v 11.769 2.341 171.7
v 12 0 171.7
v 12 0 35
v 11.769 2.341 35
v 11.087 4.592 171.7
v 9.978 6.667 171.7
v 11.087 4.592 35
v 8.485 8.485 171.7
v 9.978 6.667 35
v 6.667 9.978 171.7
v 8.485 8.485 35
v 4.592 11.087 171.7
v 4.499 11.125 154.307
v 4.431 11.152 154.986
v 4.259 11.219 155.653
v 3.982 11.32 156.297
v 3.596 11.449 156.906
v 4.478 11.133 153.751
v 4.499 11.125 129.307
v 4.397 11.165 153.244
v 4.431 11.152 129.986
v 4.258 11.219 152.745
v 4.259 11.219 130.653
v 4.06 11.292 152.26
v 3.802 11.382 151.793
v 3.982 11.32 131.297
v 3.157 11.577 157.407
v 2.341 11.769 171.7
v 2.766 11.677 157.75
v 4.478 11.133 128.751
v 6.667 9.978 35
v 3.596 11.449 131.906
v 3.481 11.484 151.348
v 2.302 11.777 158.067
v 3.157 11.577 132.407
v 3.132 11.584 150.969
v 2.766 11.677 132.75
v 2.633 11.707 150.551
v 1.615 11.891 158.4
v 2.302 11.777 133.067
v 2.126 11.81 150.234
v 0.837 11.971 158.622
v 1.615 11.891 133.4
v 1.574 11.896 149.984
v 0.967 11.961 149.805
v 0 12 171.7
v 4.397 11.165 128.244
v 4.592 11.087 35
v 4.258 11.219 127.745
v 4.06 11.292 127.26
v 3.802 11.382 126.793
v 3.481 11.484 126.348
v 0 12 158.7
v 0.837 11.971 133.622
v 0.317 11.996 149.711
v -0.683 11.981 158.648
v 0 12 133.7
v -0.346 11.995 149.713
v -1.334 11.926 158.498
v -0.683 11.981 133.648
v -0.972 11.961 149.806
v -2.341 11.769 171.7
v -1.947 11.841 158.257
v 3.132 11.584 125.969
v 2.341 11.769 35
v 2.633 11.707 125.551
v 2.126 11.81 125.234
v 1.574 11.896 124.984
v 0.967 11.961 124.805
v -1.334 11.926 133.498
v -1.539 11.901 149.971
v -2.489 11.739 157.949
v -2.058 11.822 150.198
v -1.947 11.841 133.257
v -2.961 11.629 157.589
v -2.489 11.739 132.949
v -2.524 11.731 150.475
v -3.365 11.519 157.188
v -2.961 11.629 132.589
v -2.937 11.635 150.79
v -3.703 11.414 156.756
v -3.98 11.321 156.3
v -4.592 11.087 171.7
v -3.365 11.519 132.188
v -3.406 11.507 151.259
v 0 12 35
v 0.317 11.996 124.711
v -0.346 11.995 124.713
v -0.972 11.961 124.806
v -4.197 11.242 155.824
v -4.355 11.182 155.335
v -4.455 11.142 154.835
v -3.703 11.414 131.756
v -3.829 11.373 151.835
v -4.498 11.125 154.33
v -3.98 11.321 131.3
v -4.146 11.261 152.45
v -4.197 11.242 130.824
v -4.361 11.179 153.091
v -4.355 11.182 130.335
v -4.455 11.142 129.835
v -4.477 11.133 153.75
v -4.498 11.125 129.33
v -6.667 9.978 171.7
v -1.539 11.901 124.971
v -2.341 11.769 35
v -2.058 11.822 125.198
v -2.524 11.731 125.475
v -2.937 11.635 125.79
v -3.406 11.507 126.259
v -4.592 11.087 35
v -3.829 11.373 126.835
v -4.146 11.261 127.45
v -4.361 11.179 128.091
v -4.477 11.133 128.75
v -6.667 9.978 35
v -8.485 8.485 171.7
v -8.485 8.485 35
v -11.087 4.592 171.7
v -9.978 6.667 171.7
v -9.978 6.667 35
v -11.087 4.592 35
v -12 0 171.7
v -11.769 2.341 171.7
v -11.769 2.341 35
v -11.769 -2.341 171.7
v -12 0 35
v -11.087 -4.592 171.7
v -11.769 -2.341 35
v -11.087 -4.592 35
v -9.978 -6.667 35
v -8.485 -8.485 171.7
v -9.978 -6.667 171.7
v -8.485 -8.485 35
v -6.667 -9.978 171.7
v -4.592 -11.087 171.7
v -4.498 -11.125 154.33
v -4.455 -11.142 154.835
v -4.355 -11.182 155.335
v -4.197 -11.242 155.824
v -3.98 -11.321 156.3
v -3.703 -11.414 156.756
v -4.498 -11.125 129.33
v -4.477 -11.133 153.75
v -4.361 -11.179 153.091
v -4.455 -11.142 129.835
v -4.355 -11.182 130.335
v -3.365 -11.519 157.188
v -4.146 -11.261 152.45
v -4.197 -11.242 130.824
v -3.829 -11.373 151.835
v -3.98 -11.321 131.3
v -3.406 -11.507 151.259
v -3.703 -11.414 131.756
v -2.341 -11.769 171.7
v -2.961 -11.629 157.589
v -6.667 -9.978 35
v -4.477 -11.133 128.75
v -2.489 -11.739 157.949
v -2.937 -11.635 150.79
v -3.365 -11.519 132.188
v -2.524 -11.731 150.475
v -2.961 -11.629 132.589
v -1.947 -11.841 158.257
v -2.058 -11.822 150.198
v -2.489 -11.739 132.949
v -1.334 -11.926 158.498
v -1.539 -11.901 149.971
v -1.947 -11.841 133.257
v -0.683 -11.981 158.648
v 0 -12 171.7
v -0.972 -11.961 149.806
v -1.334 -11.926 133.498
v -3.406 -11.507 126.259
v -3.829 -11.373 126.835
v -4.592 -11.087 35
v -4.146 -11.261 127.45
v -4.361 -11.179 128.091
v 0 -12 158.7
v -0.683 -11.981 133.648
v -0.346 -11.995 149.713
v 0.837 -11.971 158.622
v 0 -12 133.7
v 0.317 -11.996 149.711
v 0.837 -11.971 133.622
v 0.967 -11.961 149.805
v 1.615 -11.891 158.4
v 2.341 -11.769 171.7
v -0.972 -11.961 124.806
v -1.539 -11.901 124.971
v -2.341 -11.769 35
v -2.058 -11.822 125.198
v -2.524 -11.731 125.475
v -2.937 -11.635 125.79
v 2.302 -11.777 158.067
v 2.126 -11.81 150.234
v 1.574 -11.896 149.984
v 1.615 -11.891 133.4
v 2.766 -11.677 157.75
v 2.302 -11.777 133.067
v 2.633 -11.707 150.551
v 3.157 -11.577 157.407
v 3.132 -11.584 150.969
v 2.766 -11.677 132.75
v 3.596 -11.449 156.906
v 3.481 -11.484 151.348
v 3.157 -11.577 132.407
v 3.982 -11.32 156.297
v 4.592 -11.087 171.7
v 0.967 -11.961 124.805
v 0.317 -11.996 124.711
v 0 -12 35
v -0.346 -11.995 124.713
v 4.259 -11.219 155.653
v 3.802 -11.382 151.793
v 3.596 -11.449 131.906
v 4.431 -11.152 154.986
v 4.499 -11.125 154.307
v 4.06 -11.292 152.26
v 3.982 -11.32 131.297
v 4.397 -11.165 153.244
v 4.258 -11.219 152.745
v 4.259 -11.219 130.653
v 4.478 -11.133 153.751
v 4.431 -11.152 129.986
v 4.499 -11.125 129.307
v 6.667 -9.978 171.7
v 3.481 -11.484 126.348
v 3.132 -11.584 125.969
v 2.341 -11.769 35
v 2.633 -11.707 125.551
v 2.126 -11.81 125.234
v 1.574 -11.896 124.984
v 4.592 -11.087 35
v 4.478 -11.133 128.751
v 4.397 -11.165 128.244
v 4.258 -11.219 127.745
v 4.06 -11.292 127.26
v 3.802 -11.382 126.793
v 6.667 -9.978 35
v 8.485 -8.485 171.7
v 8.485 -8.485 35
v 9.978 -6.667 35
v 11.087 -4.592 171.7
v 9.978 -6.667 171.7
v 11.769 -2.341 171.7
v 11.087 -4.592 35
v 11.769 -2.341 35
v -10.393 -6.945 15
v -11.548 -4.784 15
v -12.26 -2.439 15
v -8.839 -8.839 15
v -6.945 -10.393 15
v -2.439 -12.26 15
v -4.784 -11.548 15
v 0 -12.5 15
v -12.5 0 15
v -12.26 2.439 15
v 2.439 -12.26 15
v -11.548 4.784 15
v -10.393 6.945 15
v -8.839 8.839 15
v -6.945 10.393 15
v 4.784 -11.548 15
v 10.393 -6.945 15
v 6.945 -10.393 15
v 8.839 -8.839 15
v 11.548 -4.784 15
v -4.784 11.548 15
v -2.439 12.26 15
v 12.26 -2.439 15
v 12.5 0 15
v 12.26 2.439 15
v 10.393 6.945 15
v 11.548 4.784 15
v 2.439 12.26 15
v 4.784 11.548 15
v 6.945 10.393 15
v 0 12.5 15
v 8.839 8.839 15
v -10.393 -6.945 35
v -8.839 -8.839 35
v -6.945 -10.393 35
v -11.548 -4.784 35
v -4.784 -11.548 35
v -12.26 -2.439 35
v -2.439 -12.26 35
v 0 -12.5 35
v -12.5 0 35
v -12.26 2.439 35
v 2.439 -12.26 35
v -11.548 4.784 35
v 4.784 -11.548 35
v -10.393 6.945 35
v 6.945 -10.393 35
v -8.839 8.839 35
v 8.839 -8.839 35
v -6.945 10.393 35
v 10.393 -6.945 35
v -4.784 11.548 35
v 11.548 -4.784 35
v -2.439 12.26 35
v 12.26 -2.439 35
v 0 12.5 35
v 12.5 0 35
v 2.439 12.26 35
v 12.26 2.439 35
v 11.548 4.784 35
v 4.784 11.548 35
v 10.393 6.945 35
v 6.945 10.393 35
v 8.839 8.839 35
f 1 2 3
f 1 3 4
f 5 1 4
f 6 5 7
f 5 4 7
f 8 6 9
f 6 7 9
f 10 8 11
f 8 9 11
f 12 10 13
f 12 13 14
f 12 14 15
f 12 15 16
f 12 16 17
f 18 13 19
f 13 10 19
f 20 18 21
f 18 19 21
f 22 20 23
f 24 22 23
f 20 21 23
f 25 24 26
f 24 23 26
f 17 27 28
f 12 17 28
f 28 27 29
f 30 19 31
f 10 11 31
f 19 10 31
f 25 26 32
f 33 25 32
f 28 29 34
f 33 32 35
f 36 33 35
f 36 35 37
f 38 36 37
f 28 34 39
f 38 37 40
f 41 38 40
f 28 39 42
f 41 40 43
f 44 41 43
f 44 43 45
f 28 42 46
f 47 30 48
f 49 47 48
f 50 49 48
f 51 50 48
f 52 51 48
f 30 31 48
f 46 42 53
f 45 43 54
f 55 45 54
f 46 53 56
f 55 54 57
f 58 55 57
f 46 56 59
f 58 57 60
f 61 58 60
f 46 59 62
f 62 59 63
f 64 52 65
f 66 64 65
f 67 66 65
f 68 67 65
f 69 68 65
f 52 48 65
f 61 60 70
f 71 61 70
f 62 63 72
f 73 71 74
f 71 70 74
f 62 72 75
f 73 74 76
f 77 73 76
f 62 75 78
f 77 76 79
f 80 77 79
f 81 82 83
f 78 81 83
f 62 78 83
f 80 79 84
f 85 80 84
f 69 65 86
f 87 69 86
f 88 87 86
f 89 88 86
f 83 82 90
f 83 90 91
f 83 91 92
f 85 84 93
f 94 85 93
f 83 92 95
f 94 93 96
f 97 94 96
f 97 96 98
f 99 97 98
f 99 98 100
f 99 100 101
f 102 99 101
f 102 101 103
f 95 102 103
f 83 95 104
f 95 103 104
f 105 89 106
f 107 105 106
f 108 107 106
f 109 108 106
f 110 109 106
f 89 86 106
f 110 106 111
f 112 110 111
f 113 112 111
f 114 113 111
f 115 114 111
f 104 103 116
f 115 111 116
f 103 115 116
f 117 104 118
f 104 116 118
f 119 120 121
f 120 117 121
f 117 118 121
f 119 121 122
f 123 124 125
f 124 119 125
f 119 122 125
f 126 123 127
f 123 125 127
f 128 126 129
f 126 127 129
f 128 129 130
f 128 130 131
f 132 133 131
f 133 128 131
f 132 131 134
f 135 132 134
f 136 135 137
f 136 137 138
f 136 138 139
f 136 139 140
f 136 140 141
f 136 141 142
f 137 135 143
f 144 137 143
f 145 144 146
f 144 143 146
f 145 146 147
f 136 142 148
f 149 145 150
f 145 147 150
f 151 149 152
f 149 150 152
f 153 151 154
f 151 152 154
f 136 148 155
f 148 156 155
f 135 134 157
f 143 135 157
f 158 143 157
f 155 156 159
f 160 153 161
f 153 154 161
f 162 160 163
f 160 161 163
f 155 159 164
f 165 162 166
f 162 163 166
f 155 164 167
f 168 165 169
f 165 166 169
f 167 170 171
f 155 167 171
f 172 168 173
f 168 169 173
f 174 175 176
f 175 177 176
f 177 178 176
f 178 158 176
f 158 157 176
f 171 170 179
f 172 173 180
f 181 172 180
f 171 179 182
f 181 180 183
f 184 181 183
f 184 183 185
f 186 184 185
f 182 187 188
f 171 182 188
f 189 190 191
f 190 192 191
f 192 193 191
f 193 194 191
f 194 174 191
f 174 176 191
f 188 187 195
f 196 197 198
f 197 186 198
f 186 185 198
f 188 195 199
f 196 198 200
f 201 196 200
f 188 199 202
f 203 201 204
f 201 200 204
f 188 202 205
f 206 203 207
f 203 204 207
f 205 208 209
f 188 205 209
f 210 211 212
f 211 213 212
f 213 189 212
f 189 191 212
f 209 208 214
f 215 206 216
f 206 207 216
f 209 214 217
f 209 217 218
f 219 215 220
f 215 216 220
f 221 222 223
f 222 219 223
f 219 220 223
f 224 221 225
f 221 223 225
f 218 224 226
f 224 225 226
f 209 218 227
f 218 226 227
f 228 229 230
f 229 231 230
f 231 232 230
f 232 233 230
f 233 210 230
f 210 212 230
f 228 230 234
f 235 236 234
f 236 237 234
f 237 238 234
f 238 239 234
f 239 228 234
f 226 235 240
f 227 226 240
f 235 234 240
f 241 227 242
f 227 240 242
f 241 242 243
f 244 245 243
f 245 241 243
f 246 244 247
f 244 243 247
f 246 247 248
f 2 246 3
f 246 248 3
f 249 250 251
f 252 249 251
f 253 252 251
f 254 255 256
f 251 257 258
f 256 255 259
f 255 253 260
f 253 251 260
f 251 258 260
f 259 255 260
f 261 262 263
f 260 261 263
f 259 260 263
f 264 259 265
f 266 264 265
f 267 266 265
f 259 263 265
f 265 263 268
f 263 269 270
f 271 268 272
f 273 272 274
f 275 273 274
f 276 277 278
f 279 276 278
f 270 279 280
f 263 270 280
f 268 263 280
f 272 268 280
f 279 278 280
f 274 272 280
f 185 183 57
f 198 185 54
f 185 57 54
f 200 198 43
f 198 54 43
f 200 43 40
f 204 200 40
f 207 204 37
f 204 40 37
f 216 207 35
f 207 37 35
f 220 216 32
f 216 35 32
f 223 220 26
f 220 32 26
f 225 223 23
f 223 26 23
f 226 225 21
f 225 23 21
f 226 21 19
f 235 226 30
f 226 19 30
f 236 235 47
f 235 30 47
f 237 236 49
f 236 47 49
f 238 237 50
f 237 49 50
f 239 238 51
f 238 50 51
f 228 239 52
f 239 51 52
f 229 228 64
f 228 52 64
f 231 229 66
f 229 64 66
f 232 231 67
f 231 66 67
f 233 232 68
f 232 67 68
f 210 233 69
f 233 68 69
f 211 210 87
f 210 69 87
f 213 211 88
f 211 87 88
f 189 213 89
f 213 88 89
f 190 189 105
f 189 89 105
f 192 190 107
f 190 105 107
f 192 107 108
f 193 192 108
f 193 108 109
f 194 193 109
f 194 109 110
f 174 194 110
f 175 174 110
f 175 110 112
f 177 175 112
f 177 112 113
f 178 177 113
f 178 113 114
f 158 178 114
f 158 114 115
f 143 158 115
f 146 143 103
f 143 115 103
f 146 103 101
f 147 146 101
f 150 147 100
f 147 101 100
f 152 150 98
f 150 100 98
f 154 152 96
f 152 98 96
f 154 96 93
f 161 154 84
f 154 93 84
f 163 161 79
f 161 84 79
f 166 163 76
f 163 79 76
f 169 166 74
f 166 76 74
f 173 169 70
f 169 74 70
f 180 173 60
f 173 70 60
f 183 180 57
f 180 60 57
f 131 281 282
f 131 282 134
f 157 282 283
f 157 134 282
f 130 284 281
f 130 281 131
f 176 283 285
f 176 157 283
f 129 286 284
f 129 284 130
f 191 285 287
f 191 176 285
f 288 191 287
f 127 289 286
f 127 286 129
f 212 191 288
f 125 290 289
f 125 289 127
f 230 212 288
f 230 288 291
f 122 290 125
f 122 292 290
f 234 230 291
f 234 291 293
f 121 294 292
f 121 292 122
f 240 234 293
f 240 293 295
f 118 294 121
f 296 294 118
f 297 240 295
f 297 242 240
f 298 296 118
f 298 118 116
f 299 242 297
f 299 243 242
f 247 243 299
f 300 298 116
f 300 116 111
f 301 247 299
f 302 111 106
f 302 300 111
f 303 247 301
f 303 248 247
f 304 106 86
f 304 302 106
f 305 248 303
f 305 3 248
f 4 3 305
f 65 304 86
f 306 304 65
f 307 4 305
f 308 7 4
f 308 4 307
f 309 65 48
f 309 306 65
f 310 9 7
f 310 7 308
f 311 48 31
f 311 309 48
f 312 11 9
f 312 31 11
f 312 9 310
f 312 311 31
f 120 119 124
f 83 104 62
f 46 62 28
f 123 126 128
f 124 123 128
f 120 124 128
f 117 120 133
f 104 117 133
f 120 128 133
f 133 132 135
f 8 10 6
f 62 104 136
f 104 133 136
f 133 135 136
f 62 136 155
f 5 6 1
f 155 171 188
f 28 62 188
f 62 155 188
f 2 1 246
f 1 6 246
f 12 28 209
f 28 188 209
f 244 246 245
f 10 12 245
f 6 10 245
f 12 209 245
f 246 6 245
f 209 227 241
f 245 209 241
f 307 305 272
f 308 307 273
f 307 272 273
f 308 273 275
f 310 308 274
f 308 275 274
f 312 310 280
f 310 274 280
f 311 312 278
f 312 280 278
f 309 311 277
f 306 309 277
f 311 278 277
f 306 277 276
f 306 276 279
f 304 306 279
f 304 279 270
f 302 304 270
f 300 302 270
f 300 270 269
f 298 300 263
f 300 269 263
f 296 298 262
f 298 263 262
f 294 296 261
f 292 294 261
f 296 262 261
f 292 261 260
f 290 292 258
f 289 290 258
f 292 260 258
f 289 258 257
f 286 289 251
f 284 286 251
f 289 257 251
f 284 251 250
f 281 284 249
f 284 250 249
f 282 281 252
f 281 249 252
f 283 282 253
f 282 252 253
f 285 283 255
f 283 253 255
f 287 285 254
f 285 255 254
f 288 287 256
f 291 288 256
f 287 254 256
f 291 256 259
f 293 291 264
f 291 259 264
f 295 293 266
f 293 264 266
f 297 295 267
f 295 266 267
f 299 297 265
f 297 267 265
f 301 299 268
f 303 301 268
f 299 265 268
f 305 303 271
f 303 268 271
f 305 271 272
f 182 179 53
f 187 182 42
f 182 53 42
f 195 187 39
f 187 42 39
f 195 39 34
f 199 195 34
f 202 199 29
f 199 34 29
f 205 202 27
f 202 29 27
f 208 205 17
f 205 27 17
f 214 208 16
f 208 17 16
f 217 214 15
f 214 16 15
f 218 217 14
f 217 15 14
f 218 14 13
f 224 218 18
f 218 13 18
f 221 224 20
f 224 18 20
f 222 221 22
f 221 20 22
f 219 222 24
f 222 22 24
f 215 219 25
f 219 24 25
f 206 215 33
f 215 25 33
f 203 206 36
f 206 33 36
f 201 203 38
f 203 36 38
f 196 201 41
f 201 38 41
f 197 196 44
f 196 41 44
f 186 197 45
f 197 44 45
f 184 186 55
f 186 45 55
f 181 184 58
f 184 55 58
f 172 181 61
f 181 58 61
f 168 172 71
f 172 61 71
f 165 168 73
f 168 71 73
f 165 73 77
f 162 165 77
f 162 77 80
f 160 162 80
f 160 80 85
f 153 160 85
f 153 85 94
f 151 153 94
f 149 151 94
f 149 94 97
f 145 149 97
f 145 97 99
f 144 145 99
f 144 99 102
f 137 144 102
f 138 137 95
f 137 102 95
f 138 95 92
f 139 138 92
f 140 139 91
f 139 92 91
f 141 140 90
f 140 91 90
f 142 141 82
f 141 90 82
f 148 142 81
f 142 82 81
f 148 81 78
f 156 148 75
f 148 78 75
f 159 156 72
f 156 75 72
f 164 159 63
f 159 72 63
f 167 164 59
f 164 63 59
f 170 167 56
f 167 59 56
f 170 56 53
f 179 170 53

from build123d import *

# Parameters (mm, degrees)
SKETCH1_R               = 10
BOSS_EXTRUDE1_DEPTH     = 15
SKETCH2_R               = 12.5
BOSS_EXTRUDE2_DEPTH     = 20
SKETCH3_R               = 12
BOSS_EXTRUDE3_DEPTH     = 139.2
SKETCH4_R               = 4.5
CUT_EXTRUDE1_DEPTH      = 176.094660113
CUT_EXTRUDE2_DEPTH      = 176.094660212
CUT_EXTRUDE2_DEPTH_BACK = 176.094660212
SKETCH5_W               = 50.129657838
SKETCH5_H               = 19.874218845
LPATTERN1_COUNT         = 2
LPATTERN1_PITCH         = 25
CUT_EXTRUDE3_DEPTH      = 176.094660212
CUT_EXTRUDE3_DEPTH_BACK = 176.094660212
SKETCH6_W               = 35.820903931
SKETCH6_H               = 2.5


with BuildPart() as part:
    # Sketch1 → Boss-Extrude1 (new body)
    with BuildSketch(Plane.XY):
        Circle(SKETCH1_R)
    extrude(amount=BOSS_EXTRUDE1_DEPTH)

    # Sketch2 → Boss-Extrude2 (add)
    with BuildSketch(Plane.XY.offset(15)):
        Circle(SKETCH2_R)
    extrude(amount=BOSS_EXTRUDE2_DEPTH)

    # Sketch3 → Boss-Extrude3 (add)
    with BuildSketch(Plane.XY.offset(35)):
        Circle(SKETCH3_R)
    extrude(amount=BOSS_EXTRUDE3_DEPTH)

    # Sketch4 → Cut-Extrude1 (cut, symmetric)
    with BuildSketch(Plane(origin=(0, 0, 0), x_dir=(1, 0, 0), z_dir=(0, 1, 0))):
        with Locations(Location((0, -154.2, 0), (0, 0, 270))):
            Circle(SKETCH4_R)
    cut_extrude1 = extrude(amount=CUT_EXTRUDE1_DEPTH, both=True, mode=Mode.SUBTRACT)

    # Sketch5 → Cut-Extrude2 (cut, two sides: drawn at the far end of the back side and taken through both)
    with BuildSketch(Plane(origin=(0, 0, 0), x_dir=(1, 0, 0), z_dir=(0, 1, 0)).offset(-CUT_EXTRUDE2_DEPTH_BACK)):
        with Locations((-12.564828919, -5.062890578)):
            Rectangle(SKETCH5_W, SKETCH5_H)
    extrude(amount=CUT_EXTRUDE2_DEPTH + CUT_EXTRUDE2_DEPTH_BACK, mode=Mode.SUBTRACT)

    # LPattern1: Cut-Extrude1 ×2
    with Locations(*[(0, 0, -i * LPATTERN1_PITCH) for i in range(1, LPATTERN1_COUNT)]):
        add(cut_extrude1, mode=Mode.SUBTRACT)

    # Sketch6 → Cut-Extrude3 (cut, two sides: drawn at the far end of the back side and taken through both)
    with BuildSketch(Plane(origin=(0, 0, 0), x_dir=(1, 0, 0), z_dir=(0, 1, 0)).offset(-CUT_EXTRUDE3_DEPTH_BACK)):
        with Locations((-5.910451966, -172.95)):
            Rectangle(SKETCH6_W, SKETCH6_H)
    extrude(amount=CUT_EXTRUDE3_DEPTH + CUT_EXTRUDE3_DEPTH_BACK, mode=Mode.SUBTRACT)


solid = part.part
